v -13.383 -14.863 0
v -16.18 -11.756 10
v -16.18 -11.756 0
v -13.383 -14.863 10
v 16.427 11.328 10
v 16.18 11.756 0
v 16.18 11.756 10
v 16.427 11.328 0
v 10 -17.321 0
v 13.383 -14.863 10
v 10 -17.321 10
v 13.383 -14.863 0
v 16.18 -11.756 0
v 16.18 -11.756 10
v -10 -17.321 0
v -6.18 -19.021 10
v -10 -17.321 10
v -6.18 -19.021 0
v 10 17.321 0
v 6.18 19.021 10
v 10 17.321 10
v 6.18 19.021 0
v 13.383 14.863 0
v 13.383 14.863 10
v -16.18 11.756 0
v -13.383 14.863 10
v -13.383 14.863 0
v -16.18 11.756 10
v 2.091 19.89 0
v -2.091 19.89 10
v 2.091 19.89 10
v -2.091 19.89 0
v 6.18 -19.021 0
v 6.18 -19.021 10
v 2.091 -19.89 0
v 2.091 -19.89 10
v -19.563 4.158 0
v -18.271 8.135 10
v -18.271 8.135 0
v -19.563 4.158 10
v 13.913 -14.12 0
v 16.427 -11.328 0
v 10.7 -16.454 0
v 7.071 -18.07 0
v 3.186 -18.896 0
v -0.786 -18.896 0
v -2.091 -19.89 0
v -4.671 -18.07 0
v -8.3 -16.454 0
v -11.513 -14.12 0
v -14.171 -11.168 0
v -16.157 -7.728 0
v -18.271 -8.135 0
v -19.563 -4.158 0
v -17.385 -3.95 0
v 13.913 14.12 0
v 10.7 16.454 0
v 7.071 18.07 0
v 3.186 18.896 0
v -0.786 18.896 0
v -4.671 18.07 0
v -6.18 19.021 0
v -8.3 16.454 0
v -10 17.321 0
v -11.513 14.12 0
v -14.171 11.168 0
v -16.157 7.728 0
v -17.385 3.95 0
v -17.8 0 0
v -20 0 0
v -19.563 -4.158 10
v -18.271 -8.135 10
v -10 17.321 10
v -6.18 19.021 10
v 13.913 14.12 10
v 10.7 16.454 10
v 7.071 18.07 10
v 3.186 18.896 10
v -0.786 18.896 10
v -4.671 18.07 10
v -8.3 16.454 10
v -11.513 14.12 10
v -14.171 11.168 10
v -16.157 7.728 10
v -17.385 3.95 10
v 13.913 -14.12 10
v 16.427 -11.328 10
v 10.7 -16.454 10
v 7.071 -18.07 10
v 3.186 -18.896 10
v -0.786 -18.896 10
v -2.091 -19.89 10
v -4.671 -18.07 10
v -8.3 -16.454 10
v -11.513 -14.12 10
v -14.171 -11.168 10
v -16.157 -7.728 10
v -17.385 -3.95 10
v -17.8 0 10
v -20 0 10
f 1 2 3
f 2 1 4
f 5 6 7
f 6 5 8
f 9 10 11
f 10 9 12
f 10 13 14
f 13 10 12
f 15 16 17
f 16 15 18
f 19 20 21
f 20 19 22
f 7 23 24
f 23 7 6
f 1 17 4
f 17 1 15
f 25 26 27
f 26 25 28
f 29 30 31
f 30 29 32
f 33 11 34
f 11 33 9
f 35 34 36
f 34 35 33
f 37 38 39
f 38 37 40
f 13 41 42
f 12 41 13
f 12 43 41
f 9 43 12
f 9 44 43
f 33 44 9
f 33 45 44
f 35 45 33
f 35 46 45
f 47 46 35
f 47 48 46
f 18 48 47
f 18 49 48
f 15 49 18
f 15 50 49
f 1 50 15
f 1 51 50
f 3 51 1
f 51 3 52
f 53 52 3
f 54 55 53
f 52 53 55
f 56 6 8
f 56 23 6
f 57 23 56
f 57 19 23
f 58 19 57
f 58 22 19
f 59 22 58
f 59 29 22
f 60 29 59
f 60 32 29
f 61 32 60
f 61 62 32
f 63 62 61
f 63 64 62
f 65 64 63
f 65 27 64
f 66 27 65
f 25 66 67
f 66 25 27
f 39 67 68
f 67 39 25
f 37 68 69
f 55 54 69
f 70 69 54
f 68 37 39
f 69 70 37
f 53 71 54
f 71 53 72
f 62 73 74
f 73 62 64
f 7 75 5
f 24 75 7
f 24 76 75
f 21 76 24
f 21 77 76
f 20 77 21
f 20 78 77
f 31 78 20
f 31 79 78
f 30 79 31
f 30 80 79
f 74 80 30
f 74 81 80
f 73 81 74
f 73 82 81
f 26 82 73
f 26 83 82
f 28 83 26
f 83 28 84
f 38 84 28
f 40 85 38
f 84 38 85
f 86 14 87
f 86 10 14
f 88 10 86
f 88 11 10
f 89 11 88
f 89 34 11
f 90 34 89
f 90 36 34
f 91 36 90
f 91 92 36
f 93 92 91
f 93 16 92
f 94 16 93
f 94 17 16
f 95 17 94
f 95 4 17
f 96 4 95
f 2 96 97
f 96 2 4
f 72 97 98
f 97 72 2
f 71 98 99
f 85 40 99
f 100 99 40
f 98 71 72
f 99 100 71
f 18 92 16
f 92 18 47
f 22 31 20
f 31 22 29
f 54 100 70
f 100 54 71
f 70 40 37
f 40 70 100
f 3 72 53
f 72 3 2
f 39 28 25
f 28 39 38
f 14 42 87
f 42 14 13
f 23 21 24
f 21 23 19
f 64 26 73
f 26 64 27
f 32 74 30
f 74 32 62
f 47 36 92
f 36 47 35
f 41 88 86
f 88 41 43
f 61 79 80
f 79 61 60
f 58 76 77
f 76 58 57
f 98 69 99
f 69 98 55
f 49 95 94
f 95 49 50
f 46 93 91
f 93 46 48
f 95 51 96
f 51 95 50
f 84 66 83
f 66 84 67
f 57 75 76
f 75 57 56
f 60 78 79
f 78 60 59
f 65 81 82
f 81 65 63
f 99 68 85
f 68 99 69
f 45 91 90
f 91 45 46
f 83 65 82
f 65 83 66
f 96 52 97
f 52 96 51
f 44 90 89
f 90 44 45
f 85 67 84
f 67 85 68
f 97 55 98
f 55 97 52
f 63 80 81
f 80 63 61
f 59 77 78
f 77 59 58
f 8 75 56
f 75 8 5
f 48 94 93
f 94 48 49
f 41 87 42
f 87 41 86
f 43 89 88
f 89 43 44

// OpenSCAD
difference() {
	cylinder(r=20, h=10);
	translate([1.2, 0, 0]) {
		cylinder(r=19, h=10);
	}
}
